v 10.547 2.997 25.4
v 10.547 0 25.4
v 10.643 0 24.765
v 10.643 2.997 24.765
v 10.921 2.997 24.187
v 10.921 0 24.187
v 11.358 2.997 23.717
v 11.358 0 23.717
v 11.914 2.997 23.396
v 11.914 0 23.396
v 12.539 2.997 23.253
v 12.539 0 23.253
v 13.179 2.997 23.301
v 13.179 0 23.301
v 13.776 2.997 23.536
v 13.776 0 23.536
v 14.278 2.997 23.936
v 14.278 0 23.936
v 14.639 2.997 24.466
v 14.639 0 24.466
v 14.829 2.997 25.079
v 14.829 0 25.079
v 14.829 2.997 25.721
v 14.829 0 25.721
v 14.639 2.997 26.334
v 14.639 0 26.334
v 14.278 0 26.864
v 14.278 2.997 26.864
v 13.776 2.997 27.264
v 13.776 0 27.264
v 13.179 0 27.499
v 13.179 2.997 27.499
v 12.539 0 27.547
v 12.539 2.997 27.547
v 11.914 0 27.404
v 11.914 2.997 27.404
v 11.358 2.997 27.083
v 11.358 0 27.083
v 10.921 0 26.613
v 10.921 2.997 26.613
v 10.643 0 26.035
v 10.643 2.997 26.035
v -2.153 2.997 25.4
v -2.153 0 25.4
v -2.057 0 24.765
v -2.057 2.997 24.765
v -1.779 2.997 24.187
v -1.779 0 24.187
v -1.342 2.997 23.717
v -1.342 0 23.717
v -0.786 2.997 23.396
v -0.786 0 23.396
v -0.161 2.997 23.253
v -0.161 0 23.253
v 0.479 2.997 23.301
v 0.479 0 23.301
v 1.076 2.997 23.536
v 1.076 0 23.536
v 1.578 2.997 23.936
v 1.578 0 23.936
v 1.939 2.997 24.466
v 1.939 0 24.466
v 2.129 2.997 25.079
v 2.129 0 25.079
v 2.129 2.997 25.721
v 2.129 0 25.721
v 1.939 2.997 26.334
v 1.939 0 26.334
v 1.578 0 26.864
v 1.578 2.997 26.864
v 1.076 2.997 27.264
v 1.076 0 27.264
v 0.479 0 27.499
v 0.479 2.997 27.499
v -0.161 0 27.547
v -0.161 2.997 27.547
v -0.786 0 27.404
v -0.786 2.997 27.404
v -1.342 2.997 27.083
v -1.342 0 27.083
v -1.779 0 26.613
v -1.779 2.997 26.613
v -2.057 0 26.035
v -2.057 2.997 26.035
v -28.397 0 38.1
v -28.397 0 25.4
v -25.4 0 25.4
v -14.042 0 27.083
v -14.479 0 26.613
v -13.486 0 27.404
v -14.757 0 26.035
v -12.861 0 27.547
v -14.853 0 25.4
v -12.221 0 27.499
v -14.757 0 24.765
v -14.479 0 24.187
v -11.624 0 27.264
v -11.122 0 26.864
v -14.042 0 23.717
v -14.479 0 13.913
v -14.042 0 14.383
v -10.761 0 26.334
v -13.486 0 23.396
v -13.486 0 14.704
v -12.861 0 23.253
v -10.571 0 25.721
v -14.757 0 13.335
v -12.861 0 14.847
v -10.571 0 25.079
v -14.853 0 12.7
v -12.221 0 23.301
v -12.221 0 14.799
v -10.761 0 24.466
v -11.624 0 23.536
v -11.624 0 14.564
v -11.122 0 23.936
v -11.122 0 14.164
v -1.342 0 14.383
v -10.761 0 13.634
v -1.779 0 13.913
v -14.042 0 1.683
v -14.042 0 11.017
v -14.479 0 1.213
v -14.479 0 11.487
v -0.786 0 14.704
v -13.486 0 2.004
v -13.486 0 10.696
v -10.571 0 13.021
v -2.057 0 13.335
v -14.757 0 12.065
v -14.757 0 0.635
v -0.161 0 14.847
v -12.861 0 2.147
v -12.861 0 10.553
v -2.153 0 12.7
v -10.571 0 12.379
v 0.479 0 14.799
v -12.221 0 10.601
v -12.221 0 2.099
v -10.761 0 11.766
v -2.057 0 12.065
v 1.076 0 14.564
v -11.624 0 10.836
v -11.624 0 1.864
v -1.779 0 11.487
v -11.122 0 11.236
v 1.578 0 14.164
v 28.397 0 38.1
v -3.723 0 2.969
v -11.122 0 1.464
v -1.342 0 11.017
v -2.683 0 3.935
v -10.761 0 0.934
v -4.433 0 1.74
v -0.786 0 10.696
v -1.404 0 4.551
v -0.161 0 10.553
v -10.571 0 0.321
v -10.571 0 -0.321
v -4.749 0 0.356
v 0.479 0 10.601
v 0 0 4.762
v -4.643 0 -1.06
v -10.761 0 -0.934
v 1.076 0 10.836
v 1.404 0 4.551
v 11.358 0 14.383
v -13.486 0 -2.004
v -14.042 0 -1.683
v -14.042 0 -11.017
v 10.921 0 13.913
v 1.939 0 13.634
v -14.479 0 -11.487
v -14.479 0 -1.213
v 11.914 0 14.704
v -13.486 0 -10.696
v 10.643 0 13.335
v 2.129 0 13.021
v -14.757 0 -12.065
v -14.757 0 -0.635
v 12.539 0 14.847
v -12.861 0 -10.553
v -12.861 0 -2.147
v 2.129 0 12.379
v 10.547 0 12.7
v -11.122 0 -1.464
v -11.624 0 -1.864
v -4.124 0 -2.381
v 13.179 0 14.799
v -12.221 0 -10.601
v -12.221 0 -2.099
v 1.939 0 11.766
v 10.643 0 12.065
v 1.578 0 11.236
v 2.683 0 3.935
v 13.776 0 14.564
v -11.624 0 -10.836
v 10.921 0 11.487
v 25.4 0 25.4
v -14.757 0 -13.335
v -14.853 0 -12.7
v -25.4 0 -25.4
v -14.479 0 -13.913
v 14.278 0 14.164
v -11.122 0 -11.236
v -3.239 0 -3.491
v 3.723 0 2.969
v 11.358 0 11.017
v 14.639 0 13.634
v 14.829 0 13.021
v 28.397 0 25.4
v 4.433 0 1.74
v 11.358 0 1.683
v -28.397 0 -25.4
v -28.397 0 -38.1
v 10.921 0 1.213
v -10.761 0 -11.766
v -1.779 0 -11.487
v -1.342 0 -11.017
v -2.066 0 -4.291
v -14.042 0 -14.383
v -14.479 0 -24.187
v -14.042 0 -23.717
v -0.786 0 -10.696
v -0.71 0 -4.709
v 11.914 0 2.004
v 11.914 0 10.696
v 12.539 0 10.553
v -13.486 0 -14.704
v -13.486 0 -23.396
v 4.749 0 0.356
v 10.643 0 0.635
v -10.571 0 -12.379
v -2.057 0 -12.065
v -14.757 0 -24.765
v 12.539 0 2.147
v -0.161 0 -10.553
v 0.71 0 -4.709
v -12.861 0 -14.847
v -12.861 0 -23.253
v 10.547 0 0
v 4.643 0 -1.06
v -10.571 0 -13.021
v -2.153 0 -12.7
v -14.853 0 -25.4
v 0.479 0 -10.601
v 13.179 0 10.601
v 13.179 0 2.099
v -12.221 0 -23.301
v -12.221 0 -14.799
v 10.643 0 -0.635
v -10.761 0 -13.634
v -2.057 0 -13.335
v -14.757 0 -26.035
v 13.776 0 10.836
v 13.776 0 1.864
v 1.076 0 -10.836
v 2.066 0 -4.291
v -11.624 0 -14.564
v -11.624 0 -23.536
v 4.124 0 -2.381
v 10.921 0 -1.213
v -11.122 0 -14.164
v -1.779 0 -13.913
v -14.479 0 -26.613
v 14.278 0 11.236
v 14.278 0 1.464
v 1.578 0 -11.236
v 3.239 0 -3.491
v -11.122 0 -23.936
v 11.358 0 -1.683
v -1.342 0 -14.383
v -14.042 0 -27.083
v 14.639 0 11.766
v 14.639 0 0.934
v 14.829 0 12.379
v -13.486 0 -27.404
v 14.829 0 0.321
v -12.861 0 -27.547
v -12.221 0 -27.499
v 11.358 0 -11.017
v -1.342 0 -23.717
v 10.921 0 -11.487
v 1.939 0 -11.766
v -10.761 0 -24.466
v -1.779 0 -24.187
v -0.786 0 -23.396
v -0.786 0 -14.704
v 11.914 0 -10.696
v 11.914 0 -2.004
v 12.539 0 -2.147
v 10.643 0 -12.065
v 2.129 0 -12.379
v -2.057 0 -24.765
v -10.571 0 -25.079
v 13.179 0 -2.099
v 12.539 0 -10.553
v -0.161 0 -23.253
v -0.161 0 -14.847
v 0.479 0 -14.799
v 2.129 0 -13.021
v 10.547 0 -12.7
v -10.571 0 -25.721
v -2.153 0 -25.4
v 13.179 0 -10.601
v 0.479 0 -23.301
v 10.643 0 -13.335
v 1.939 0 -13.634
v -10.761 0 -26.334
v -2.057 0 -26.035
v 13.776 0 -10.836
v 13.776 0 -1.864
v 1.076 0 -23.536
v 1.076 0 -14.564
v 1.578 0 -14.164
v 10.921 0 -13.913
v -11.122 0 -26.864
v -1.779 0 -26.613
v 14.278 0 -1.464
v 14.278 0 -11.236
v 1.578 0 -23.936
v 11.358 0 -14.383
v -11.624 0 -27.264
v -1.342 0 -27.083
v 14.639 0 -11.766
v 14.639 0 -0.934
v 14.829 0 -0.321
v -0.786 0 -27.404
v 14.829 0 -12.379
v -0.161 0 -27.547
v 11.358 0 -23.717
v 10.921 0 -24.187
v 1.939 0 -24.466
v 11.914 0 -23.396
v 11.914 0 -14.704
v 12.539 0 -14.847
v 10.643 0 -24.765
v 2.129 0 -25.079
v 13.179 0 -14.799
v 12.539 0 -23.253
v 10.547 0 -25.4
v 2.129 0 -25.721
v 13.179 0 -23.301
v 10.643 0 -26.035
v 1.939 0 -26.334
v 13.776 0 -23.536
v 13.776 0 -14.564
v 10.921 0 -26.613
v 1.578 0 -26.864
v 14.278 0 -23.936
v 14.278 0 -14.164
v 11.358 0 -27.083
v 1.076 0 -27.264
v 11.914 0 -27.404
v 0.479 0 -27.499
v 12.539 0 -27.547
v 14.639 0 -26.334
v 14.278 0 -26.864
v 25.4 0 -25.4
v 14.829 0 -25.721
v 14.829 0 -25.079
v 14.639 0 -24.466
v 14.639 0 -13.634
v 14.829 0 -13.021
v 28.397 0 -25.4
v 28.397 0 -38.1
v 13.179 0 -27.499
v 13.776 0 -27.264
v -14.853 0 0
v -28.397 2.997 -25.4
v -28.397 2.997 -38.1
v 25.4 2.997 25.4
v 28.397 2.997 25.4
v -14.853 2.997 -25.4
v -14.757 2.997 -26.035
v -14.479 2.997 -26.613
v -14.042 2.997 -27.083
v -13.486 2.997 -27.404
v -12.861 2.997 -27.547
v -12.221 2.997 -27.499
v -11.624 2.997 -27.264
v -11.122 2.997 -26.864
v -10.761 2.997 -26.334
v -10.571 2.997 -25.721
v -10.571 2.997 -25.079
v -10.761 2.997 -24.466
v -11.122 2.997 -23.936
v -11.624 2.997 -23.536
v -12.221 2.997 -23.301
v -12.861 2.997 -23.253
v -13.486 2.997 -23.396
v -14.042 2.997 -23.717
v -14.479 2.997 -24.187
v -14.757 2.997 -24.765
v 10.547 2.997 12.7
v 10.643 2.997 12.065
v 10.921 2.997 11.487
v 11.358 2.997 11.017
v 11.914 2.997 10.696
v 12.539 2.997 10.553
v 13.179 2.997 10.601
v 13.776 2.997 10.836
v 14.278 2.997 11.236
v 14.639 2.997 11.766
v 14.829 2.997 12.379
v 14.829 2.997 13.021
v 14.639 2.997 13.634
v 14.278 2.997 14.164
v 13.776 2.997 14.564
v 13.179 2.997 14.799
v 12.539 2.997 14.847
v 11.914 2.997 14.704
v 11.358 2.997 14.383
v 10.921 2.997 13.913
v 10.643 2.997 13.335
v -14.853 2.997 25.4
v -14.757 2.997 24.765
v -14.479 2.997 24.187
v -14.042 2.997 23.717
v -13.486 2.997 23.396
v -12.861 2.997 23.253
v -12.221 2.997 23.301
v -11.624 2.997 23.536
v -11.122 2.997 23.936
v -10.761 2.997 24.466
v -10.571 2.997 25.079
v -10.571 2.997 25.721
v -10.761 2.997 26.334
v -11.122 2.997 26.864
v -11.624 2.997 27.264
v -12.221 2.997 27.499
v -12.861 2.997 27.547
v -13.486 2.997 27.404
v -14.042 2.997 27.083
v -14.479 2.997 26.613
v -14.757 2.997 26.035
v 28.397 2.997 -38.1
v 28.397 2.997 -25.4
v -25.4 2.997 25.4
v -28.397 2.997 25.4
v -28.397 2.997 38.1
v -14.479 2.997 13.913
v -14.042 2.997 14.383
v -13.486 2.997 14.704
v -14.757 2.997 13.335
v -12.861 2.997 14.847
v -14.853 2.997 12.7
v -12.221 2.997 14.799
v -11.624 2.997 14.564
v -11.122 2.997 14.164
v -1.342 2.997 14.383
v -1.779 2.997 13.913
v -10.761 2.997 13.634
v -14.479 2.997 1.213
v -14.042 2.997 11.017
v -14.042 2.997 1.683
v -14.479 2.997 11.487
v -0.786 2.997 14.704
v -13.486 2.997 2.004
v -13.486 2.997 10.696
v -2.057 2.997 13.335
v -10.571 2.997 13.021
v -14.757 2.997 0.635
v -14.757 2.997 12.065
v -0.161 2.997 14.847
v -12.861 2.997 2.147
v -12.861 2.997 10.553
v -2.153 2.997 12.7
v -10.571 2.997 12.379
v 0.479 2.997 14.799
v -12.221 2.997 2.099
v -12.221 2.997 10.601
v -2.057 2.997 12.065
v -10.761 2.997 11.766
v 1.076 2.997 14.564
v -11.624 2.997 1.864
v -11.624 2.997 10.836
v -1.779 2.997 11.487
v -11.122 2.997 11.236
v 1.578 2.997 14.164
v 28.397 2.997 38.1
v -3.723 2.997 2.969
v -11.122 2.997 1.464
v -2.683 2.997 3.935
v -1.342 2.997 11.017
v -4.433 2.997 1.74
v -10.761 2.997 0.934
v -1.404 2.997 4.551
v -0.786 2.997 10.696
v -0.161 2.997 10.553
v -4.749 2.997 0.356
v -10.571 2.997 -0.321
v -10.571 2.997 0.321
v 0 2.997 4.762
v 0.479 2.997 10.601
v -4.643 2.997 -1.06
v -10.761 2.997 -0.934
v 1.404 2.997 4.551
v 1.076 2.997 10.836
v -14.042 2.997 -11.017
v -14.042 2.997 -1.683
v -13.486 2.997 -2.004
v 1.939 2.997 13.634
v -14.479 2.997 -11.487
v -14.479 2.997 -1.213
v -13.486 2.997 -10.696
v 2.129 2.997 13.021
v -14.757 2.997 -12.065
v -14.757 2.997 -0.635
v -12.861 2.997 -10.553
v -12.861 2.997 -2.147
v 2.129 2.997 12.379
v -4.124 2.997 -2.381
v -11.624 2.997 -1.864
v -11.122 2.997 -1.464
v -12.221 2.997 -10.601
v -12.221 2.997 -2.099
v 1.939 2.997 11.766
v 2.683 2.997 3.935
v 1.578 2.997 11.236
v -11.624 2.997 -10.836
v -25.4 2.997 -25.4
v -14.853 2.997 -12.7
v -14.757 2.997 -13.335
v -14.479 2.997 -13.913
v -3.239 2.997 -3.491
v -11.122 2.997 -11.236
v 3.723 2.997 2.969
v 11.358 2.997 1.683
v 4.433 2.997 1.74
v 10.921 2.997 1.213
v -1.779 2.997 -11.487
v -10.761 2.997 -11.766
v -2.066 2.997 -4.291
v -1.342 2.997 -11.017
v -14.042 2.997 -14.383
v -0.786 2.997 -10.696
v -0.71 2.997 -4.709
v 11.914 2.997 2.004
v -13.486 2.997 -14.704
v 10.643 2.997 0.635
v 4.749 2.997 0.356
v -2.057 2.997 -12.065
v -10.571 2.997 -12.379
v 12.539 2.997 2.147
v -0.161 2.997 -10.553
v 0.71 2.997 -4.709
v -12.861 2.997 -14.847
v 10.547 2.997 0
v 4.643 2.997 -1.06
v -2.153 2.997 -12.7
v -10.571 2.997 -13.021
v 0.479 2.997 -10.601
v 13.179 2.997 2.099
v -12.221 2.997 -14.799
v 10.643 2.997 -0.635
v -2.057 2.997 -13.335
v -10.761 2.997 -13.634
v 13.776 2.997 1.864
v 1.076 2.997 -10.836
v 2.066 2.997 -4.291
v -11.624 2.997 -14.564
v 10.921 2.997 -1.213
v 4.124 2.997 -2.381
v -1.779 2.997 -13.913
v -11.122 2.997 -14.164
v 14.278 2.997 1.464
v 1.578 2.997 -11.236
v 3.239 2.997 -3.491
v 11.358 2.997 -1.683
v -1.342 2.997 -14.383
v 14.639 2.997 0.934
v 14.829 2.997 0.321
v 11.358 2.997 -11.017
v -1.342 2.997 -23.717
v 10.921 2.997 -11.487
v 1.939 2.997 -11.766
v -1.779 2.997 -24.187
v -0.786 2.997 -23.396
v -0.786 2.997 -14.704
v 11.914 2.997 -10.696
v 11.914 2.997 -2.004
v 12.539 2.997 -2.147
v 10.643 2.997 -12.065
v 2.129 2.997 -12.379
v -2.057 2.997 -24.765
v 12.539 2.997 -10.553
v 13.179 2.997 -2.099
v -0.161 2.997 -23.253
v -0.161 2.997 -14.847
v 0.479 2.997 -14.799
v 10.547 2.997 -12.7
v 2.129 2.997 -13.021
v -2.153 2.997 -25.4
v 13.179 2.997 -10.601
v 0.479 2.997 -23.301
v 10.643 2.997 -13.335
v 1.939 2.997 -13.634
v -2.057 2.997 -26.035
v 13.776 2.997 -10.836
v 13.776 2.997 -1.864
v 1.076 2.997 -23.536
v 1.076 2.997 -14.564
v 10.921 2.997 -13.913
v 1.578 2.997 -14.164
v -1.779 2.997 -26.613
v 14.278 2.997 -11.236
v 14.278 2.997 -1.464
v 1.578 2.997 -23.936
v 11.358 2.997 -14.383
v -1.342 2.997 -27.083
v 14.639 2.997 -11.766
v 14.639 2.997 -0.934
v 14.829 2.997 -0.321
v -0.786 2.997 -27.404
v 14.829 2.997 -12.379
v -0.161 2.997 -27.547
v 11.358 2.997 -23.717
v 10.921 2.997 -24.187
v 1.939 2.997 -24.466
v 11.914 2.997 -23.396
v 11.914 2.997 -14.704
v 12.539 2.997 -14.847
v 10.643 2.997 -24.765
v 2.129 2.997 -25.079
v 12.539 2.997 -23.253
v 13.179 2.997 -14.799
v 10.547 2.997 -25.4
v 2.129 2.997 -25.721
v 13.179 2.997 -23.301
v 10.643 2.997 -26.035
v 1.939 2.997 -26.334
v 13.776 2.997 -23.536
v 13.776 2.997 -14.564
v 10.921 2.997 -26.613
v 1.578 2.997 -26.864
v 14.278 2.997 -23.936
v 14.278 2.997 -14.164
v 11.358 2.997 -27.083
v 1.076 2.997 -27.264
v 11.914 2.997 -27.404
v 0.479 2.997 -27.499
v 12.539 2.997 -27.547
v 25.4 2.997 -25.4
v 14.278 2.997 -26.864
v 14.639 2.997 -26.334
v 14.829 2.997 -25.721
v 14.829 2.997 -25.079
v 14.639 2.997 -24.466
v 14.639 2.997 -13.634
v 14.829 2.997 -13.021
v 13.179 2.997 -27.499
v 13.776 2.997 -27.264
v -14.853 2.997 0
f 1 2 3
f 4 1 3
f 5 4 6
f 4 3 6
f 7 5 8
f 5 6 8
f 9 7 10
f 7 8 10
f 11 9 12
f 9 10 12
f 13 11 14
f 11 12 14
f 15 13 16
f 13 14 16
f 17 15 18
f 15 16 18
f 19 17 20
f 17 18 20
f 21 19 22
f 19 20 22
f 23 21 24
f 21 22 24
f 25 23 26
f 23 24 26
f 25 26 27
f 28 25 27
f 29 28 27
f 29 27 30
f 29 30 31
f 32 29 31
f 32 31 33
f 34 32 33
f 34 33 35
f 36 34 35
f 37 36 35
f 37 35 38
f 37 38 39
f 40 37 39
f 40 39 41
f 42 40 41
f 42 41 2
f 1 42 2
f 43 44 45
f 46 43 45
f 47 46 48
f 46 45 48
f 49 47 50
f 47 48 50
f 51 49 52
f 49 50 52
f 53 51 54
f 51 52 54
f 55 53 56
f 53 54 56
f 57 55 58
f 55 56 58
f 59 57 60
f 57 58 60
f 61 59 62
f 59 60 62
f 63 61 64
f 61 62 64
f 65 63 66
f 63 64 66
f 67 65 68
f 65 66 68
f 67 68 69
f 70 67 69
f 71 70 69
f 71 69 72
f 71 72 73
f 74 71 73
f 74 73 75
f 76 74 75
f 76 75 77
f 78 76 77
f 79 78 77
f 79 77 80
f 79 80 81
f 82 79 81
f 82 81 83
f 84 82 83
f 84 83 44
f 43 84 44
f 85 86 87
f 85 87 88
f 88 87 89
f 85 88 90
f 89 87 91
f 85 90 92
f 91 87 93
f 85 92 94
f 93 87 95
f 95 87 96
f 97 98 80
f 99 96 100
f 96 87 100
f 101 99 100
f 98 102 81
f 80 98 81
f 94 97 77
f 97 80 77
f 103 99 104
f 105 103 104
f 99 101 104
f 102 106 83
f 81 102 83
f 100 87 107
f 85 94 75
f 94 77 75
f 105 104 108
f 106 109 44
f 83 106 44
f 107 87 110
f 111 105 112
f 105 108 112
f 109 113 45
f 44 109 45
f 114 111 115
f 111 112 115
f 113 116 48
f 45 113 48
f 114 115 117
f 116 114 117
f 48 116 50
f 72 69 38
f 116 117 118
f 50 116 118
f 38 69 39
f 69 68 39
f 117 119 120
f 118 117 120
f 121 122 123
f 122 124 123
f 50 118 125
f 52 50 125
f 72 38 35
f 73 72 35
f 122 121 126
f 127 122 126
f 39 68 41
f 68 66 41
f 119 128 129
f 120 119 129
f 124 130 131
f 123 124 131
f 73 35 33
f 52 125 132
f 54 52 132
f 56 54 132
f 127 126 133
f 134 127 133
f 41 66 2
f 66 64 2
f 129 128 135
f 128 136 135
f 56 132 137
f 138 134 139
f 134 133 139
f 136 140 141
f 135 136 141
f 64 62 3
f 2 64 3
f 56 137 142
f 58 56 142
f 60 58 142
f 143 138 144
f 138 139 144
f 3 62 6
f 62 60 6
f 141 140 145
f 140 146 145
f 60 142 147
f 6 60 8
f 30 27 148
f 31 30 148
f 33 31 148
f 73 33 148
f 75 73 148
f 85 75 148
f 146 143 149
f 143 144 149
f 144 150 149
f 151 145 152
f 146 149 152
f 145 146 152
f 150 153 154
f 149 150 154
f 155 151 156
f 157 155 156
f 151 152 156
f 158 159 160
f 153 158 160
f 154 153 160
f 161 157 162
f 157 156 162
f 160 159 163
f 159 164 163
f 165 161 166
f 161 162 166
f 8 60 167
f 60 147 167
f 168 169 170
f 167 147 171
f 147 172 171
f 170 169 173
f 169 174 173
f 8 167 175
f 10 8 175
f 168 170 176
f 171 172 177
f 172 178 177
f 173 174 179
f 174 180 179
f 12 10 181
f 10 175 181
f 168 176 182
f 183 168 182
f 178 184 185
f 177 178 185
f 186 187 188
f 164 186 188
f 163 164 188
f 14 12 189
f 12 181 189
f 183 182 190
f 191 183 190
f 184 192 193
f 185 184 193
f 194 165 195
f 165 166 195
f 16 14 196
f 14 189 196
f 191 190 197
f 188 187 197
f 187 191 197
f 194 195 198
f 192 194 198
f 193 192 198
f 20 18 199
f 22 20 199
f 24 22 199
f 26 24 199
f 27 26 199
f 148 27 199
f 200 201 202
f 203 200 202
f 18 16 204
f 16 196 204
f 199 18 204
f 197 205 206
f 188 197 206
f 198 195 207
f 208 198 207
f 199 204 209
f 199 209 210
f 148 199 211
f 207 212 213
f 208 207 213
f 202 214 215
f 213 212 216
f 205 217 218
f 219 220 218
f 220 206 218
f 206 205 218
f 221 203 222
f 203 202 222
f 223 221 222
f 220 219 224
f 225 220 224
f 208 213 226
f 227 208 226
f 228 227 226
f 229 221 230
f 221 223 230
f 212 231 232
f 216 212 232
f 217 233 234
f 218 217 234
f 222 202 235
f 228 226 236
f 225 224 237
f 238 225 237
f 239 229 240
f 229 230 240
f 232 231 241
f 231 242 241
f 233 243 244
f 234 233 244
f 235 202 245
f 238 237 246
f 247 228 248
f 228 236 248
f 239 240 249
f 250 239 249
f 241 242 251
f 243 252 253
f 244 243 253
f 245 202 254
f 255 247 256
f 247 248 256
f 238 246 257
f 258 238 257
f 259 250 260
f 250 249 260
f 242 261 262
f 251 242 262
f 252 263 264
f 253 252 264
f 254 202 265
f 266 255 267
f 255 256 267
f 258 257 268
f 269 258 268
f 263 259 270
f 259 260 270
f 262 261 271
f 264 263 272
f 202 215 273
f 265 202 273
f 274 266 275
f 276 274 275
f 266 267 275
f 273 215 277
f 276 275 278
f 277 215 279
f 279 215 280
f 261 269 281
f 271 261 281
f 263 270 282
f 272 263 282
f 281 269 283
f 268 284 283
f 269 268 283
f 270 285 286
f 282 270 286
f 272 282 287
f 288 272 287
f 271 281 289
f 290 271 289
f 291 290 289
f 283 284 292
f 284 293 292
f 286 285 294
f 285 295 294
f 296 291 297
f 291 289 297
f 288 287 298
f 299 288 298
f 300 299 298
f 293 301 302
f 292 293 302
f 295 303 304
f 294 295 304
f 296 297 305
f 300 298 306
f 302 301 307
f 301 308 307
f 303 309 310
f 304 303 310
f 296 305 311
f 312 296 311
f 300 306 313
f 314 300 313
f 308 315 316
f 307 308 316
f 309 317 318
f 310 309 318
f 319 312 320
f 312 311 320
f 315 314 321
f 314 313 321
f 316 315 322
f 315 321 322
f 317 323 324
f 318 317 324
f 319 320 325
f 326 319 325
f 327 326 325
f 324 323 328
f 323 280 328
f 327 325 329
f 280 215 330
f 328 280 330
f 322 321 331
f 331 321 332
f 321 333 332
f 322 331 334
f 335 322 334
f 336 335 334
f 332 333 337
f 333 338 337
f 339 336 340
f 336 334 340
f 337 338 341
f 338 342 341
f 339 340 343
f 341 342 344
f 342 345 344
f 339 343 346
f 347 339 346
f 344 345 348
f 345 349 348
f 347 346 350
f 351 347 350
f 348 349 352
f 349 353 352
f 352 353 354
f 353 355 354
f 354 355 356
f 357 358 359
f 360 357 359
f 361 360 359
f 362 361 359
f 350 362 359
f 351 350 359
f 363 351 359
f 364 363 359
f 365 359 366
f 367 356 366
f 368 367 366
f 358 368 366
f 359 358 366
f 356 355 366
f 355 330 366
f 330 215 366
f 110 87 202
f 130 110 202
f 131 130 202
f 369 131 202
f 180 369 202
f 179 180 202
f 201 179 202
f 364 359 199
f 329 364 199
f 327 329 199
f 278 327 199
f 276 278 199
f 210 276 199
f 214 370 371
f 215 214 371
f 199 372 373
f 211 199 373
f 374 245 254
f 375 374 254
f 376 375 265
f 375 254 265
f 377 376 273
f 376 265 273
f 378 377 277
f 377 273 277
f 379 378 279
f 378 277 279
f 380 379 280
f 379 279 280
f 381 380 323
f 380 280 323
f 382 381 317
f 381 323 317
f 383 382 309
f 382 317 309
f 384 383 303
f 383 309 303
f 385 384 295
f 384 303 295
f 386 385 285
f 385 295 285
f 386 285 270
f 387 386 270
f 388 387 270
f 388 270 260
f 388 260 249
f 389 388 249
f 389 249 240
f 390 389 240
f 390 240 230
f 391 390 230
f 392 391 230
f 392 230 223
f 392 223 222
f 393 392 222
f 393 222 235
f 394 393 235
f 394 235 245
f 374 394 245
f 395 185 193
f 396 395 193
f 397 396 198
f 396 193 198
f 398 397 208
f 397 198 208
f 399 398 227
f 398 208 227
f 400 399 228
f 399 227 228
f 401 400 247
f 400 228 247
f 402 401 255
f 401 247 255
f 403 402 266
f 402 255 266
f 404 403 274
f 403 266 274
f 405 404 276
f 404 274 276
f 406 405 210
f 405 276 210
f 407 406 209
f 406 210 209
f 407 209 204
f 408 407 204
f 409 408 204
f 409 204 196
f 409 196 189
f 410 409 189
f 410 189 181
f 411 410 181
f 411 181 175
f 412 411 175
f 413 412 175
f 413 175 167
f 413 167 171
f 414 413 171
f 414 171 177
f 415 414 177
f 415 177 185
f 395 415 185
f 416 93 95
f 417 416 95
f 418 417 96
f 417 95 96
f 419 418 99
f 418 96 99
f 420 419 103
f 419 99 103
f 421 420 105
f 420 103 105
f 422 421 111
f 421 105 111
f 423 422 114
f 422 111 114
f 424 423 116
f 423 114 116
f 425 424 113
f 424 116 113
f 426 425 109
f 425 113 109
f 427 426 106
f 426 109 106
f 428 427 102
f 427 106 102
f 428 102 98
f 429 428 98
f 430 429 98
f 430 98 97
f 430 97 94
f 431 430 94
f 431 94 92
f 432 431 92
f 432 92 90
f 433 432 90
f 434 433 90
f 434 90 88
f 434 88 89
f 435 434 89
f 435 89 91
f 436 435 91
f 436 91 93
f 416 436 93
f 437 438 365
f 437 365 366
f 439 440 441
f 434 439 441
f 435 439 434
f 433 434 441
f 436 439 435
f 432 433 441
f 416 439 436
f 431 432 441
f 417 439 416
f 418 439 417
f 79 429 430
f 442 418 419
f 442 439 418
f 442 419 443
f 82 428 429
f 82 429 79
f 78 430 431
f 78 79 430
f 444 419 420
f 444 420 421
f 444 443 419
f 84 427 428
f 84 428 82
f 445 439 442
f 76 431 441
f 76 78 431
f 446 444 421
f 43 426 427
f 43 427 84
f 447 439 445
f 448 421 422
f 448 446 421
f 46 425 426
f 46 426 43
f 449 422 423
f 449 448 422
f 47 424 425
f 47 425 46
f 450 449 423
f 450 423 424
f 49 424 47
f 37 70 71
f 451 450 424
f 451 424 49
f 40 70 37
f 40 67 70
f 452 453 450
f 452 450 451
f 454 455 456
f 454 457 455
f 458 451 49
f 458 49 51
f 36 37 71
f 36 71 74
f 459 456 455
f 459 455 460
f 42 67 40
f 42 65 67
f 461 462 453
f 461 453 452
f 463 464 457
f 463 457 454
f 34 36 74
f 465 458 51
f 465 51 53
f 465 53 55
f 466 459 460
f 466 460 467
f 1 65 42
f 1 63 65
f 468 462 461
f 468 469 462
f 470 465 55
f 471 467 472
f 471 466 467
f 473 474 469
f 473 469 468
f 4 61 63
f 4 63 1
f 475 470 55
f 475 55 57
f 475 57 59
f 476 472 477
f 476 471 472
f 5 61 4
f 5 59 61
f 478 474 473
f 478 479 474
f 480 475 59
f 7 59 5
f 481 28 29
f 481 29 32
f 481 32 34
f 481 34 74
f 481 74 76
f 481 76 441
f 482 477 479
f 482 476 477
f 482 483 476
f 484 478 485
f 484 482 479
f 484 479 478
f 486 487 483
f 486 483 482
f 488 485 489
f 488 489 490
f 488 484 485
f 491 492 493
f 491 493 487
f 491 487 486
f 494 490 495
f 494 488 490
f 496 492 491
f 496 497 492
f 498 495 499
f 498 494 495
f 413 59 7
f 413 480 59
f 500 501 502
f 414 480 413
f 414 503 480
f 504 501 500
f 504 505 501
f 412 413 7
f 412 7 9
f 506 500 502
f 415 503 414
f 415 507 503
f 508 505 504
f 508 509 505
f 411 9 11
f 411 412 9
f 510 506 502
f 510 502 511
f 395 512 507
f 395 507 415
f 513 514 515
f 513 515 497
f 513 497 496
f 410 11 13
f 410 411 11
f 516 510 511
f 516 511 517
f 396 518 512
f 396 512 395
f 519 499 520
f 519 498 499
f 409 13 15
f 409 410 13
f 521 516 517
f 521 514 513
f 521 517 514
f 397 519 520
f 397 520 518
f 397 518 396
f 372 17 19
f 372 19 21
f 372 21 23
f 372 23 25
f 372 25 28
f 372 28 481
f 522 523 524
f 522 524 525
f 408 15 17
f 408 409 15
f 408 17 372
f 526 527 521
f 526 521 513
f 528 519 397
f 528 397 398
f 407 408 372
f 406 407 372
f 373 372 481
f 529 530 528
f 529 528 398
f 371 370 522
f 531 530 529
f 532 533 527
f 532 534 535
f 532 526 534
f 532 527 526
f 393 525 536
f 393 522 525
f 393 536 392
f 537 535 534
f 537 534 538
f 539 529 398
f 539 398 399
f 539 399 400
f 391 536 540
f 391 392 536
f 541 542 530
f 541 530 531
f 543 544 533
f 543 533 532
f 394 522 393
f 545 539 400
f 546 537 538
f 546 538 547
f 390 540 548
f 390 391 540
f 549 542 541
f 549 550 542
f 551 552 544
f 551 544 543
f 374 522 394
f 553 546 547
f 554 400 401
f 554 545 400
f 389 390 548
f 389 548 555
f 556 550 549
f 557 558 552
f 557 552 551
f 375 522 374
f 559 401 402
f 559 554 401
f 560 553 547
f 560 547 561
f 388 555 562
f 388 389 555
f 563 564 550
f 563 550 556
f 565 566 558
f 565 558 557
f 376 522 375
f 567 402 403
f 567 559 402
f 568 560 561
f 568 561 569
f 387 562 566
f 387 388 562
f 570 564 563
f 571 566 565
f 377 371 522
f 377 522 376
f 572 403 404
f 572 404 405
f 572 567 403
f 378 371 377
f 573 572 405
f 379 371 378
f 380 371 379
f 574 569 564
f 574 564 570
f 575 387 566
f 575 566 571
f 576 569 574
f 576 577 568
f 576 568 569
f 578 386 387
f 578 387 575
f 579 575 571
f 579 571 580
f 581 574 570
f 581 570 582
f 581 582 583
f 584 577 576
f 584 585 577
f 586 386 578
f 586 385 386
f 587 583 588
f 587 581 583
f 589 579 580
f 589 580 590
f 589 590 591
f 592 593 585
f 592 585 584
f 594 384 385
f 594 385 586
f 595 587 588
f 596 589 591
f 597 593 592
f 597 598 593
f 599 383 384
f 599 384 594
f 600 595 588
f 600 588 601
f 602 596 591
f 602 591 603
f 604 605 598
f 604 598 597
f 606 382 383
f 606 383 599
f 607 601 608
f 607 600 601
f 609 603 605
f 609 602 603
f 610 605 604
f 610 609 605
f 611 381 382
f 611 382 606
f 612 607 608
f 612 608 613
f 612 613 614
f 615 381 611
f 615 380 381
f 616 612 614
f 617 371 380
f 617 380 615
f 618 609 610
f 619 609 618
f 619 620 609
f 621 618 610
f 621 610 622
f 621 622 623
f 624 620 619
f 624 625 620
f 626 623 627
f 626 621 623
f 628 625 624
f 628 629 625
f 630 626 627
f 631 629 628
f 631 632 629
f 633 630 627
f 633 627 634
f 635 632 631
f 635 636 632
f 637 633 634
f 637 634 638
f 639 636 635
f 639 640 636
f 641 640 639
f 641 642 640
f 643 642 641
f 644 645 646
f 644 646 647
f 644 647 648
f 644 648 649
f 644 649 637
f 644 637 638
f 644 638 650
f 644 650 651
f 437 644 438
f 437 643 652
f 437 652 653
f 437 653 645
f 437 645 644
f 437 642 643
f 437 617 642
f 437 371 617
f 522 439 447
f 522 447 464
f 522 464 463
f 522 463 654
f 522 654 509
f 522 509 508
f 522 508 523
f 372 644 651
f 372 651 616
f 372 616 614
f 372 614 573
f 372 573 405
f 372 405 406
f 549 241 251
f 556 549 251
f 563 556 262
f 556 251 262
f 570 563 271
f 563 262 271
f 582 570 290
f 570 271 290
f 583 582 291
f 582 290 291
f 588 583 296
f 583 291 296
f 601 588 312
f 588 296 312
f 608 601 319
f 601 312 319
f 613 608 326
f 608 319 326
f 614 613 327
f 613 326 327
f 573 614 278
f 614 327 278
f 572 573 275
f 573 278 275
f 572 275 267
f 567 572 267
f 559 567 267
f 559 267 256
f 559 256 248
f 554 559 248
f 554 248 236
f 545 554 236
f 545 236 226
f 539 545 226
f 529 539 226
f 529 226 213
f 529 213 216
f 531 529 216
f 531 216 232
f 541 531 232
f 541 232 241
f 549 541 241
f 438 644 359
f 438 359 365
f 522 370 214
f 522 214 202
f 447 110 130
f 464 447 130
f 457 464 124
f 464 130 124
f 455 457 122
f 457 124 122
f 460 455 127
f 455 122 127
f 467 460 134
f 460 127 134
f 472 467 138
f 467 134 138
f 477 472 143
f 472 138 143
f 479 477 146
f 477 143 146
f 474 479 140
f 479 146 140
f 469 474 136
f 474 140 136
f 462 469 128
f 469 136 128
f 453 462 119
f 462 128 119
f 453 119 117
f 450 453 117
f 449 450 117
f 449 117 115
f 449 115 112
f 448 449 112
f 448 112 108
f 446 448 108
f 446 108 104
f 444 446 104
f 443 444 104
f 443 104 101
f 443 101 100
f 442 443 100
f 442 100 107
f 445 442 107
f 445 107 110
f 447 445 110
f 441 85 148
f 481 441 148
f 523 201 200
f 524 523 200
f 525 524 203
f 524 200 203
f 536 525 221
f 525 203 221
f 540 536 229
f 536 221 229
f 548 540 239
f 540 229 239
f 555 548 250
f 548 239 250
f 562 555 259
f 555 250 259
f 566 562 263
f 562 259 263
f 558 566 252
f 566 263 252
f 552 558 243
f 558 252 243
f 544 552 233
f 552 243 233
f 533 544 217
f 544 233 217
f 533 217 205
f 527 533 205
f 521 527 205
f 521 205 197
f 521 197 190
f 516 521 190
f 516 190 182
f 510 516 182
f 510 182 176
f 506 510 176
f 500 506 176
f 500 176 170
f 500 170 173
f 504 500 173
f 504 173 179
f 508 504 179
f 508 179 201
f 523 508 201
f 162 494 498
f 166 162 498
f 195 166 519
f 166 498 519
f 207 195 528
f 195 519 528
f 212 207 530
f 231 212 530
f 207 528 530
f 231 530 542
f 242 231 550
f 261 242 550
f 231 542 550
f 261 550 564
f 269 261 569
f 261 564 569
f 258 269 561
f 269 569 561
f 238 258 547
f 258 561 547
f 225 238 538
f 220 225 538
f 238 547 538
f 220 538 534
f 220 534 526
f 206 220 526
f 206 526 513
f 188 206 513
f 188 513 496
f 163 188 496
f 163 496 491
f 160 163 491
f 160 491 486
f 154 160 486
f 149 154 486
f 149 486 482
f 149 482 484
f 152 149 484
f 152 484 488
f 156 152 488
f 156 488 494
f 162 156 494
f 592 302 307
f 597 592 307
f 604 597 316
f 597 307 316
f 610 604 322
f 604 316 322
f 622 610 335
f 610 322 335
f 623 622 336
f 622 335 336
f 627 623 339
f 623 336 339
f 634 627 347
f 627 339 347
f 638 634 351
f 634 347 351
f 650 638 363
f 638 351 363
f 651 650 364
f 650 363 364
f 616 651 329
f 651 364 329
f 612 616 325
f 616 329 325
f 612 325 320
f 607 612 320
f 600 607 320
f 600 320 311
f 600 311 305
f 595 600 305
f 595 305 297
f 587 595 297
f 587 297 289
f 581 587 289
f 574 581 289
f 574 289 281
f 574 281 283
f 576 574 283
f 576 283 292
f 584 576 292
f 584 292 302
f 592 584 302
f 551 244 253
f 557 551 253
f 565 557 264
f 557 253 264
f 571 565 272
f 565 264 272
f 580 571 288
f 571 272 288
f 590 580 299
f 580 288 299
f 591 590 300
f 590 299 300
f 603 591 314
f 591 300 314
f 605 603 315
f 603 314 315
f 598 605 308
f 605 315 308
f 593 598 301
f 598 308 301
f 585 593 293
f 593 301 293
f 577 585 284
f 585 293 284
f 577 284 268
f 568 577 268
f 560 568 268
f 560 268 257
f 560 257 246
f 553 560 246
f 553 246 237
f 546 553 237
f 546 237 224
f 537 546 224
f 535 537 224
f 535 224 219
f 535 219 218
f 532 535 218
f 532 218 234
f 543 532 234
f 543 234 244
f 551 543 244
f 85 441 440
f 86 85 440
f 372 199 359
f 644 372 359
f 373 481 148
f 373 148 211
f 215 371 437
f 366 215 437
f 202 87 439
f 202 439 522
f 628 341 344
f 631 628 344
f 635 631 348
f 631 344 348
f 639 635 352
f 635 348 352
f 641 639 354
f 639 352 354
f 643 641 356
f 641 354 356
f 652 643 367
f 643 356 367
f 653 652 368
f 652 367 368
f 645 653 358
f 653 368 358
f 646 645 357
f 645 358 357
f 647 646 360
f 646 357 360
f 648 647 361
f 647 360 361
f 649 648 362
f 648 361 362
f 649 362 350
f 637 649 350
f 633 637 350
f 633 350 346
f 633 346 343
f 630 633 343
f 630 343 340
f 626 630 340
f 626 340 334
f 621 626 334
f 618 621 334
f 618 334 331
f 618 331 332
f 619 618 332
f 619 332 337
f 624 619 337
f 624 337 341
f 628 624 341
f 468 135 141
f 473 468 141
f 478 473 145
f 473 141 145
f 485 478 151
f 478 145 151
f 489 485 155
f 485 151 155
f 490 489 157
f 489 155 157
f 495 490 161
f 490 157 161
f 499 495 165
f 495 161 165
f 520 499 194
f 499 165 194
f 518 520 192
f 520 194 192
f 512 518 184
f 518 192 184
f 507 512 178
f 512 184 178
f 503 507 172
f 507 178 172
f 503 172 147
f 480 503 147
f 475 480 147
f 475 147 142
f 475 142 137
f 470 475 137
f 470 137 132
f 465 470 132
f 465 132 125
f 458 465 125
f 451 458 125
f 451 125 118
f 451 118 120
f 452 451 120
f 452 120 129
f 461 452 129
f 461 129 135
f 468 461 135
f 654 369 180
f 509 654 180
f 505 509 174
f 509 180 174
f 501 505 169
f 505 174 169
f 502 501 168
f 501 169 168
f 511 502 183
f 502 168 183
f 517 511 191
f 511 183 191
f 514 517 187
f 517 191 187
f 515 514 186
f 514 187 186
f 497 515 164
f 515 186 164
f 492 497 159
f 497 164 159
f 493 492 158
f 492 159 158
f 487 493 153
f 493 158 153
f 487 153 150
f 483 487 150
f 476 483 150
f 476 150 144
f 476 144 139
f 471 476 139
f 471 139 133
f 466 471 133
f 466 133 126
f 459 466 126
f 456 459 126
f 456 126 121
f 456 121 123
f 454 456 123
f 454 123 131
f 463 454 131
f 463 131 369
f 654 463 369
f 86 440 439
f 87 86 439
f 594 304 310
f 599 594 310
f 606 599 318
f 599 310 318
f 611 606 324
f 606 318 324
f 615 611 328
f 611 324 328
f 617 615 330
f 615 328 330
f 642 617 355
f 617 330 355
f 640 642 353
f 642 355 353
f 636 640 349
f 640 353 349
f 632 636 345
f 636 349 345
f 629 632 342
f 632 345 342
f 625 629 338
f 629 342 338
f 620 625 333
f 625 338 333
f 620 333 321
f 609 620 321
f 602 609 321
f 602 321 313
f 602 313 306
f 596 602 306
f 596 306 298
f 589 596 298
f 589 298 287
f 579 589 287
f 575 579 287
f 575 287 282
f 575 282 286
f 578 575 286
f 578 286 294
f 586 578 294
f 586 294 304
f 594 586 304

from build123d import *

# Parameters (mm, degrees)
SKETCH1_W                 = 50.8
SKETCH1_H                 = 76.2
BOSS_EXTRUDE1_DEPTH       = 2.9972
SKETCH2_W                 = 2.9972
SKETCH2_H                 = 12.7
BOSS_EXTRUDE2_DEPTH       = 2.9972
F_8_CLEARANCE_HOLE1_D     = 4.3053
F_8_CLEARANCE_HOLE1_DEPTH = 6.351016
SKETCH6_R                 = 4.7625
CUT_EXTRUDE1_DEPTH        = 48.612962265


with BuildPart() as part:
    # Sketch1 → Boss-Extrude1 (new body)
    with BuildSketch(Plane(origin=(0, 0, 0), x_dir=(1, 0, 0), z_dir=(0, 1, 0))):
        Rectangle(SKETCH1_W, SKETCH1_H)
    extrude(amount=BOSS_EXTRUDE1_DEPTH)

    # Sketch2 → Boss-Extrude2 (add)
    with BuildSketch(Plane(origin=(0, 2.9972, 0), x_dir=(1, 0, 0), z_dir=(0, 1, 0))):
        with Locations((26.8986, 31.75)):
            Rectangle(SKETCH2_W, SKETCH2_H)
        with Locations((26.8986, -31.75)):
            Rectangle(SKETCH2_W, SKETCH2_H)
        with Locations((-26.8986, -31.75)):
            Rectangle(SKETCH2_W, SKETCH2_H)
        with Locations((-26.8986, 31.75)):
            Rectangle(SKETCH2_W, SKETCH2_H)
    extrude(amount=-BOSS_EXTRUDE2_DEPTH)

    # #8 Clearance Hole1
    with Locations(Plane(origin=(0, 2.9972, 0), x_dir=(1, 0, 0), z_dir=(0, 1, 0))):
        with Locations((12.7, -25.4), (0, -25.4), (-12.7, -25.4), (-12.7, -12.7), (0, -12.7), (12.7, -12.7), (-12.7, 0), (0, 0), (12.7, 0), (12.7, 12.7), (0, 12.7), (-12.7, 12.7), (-12.7, 25.4), (0, 25.4), (12.7, 25.4)):
            Hole(F_8_CLEARANCE_HOLE1_D / 2, depth=F_8_CLEARANCE_HOLE1_DEPTH)

    # Sketch6 → Cut-Extrude1 (cut, through all)
    with BuildSketch(Plane(origin=(0, 2.9972, 0), x_dir=(1, 0, 0), z_dir=(0, 1, 0))):
        with Locations(Location((0, 0, 0), (0, 0, 270))):
            Circle(SKETCH6_R)
    extrude(amount=-CUT_EXTRUDE1_DEPTH, mode=Mode.SUBTRACT)


solid = part.part
